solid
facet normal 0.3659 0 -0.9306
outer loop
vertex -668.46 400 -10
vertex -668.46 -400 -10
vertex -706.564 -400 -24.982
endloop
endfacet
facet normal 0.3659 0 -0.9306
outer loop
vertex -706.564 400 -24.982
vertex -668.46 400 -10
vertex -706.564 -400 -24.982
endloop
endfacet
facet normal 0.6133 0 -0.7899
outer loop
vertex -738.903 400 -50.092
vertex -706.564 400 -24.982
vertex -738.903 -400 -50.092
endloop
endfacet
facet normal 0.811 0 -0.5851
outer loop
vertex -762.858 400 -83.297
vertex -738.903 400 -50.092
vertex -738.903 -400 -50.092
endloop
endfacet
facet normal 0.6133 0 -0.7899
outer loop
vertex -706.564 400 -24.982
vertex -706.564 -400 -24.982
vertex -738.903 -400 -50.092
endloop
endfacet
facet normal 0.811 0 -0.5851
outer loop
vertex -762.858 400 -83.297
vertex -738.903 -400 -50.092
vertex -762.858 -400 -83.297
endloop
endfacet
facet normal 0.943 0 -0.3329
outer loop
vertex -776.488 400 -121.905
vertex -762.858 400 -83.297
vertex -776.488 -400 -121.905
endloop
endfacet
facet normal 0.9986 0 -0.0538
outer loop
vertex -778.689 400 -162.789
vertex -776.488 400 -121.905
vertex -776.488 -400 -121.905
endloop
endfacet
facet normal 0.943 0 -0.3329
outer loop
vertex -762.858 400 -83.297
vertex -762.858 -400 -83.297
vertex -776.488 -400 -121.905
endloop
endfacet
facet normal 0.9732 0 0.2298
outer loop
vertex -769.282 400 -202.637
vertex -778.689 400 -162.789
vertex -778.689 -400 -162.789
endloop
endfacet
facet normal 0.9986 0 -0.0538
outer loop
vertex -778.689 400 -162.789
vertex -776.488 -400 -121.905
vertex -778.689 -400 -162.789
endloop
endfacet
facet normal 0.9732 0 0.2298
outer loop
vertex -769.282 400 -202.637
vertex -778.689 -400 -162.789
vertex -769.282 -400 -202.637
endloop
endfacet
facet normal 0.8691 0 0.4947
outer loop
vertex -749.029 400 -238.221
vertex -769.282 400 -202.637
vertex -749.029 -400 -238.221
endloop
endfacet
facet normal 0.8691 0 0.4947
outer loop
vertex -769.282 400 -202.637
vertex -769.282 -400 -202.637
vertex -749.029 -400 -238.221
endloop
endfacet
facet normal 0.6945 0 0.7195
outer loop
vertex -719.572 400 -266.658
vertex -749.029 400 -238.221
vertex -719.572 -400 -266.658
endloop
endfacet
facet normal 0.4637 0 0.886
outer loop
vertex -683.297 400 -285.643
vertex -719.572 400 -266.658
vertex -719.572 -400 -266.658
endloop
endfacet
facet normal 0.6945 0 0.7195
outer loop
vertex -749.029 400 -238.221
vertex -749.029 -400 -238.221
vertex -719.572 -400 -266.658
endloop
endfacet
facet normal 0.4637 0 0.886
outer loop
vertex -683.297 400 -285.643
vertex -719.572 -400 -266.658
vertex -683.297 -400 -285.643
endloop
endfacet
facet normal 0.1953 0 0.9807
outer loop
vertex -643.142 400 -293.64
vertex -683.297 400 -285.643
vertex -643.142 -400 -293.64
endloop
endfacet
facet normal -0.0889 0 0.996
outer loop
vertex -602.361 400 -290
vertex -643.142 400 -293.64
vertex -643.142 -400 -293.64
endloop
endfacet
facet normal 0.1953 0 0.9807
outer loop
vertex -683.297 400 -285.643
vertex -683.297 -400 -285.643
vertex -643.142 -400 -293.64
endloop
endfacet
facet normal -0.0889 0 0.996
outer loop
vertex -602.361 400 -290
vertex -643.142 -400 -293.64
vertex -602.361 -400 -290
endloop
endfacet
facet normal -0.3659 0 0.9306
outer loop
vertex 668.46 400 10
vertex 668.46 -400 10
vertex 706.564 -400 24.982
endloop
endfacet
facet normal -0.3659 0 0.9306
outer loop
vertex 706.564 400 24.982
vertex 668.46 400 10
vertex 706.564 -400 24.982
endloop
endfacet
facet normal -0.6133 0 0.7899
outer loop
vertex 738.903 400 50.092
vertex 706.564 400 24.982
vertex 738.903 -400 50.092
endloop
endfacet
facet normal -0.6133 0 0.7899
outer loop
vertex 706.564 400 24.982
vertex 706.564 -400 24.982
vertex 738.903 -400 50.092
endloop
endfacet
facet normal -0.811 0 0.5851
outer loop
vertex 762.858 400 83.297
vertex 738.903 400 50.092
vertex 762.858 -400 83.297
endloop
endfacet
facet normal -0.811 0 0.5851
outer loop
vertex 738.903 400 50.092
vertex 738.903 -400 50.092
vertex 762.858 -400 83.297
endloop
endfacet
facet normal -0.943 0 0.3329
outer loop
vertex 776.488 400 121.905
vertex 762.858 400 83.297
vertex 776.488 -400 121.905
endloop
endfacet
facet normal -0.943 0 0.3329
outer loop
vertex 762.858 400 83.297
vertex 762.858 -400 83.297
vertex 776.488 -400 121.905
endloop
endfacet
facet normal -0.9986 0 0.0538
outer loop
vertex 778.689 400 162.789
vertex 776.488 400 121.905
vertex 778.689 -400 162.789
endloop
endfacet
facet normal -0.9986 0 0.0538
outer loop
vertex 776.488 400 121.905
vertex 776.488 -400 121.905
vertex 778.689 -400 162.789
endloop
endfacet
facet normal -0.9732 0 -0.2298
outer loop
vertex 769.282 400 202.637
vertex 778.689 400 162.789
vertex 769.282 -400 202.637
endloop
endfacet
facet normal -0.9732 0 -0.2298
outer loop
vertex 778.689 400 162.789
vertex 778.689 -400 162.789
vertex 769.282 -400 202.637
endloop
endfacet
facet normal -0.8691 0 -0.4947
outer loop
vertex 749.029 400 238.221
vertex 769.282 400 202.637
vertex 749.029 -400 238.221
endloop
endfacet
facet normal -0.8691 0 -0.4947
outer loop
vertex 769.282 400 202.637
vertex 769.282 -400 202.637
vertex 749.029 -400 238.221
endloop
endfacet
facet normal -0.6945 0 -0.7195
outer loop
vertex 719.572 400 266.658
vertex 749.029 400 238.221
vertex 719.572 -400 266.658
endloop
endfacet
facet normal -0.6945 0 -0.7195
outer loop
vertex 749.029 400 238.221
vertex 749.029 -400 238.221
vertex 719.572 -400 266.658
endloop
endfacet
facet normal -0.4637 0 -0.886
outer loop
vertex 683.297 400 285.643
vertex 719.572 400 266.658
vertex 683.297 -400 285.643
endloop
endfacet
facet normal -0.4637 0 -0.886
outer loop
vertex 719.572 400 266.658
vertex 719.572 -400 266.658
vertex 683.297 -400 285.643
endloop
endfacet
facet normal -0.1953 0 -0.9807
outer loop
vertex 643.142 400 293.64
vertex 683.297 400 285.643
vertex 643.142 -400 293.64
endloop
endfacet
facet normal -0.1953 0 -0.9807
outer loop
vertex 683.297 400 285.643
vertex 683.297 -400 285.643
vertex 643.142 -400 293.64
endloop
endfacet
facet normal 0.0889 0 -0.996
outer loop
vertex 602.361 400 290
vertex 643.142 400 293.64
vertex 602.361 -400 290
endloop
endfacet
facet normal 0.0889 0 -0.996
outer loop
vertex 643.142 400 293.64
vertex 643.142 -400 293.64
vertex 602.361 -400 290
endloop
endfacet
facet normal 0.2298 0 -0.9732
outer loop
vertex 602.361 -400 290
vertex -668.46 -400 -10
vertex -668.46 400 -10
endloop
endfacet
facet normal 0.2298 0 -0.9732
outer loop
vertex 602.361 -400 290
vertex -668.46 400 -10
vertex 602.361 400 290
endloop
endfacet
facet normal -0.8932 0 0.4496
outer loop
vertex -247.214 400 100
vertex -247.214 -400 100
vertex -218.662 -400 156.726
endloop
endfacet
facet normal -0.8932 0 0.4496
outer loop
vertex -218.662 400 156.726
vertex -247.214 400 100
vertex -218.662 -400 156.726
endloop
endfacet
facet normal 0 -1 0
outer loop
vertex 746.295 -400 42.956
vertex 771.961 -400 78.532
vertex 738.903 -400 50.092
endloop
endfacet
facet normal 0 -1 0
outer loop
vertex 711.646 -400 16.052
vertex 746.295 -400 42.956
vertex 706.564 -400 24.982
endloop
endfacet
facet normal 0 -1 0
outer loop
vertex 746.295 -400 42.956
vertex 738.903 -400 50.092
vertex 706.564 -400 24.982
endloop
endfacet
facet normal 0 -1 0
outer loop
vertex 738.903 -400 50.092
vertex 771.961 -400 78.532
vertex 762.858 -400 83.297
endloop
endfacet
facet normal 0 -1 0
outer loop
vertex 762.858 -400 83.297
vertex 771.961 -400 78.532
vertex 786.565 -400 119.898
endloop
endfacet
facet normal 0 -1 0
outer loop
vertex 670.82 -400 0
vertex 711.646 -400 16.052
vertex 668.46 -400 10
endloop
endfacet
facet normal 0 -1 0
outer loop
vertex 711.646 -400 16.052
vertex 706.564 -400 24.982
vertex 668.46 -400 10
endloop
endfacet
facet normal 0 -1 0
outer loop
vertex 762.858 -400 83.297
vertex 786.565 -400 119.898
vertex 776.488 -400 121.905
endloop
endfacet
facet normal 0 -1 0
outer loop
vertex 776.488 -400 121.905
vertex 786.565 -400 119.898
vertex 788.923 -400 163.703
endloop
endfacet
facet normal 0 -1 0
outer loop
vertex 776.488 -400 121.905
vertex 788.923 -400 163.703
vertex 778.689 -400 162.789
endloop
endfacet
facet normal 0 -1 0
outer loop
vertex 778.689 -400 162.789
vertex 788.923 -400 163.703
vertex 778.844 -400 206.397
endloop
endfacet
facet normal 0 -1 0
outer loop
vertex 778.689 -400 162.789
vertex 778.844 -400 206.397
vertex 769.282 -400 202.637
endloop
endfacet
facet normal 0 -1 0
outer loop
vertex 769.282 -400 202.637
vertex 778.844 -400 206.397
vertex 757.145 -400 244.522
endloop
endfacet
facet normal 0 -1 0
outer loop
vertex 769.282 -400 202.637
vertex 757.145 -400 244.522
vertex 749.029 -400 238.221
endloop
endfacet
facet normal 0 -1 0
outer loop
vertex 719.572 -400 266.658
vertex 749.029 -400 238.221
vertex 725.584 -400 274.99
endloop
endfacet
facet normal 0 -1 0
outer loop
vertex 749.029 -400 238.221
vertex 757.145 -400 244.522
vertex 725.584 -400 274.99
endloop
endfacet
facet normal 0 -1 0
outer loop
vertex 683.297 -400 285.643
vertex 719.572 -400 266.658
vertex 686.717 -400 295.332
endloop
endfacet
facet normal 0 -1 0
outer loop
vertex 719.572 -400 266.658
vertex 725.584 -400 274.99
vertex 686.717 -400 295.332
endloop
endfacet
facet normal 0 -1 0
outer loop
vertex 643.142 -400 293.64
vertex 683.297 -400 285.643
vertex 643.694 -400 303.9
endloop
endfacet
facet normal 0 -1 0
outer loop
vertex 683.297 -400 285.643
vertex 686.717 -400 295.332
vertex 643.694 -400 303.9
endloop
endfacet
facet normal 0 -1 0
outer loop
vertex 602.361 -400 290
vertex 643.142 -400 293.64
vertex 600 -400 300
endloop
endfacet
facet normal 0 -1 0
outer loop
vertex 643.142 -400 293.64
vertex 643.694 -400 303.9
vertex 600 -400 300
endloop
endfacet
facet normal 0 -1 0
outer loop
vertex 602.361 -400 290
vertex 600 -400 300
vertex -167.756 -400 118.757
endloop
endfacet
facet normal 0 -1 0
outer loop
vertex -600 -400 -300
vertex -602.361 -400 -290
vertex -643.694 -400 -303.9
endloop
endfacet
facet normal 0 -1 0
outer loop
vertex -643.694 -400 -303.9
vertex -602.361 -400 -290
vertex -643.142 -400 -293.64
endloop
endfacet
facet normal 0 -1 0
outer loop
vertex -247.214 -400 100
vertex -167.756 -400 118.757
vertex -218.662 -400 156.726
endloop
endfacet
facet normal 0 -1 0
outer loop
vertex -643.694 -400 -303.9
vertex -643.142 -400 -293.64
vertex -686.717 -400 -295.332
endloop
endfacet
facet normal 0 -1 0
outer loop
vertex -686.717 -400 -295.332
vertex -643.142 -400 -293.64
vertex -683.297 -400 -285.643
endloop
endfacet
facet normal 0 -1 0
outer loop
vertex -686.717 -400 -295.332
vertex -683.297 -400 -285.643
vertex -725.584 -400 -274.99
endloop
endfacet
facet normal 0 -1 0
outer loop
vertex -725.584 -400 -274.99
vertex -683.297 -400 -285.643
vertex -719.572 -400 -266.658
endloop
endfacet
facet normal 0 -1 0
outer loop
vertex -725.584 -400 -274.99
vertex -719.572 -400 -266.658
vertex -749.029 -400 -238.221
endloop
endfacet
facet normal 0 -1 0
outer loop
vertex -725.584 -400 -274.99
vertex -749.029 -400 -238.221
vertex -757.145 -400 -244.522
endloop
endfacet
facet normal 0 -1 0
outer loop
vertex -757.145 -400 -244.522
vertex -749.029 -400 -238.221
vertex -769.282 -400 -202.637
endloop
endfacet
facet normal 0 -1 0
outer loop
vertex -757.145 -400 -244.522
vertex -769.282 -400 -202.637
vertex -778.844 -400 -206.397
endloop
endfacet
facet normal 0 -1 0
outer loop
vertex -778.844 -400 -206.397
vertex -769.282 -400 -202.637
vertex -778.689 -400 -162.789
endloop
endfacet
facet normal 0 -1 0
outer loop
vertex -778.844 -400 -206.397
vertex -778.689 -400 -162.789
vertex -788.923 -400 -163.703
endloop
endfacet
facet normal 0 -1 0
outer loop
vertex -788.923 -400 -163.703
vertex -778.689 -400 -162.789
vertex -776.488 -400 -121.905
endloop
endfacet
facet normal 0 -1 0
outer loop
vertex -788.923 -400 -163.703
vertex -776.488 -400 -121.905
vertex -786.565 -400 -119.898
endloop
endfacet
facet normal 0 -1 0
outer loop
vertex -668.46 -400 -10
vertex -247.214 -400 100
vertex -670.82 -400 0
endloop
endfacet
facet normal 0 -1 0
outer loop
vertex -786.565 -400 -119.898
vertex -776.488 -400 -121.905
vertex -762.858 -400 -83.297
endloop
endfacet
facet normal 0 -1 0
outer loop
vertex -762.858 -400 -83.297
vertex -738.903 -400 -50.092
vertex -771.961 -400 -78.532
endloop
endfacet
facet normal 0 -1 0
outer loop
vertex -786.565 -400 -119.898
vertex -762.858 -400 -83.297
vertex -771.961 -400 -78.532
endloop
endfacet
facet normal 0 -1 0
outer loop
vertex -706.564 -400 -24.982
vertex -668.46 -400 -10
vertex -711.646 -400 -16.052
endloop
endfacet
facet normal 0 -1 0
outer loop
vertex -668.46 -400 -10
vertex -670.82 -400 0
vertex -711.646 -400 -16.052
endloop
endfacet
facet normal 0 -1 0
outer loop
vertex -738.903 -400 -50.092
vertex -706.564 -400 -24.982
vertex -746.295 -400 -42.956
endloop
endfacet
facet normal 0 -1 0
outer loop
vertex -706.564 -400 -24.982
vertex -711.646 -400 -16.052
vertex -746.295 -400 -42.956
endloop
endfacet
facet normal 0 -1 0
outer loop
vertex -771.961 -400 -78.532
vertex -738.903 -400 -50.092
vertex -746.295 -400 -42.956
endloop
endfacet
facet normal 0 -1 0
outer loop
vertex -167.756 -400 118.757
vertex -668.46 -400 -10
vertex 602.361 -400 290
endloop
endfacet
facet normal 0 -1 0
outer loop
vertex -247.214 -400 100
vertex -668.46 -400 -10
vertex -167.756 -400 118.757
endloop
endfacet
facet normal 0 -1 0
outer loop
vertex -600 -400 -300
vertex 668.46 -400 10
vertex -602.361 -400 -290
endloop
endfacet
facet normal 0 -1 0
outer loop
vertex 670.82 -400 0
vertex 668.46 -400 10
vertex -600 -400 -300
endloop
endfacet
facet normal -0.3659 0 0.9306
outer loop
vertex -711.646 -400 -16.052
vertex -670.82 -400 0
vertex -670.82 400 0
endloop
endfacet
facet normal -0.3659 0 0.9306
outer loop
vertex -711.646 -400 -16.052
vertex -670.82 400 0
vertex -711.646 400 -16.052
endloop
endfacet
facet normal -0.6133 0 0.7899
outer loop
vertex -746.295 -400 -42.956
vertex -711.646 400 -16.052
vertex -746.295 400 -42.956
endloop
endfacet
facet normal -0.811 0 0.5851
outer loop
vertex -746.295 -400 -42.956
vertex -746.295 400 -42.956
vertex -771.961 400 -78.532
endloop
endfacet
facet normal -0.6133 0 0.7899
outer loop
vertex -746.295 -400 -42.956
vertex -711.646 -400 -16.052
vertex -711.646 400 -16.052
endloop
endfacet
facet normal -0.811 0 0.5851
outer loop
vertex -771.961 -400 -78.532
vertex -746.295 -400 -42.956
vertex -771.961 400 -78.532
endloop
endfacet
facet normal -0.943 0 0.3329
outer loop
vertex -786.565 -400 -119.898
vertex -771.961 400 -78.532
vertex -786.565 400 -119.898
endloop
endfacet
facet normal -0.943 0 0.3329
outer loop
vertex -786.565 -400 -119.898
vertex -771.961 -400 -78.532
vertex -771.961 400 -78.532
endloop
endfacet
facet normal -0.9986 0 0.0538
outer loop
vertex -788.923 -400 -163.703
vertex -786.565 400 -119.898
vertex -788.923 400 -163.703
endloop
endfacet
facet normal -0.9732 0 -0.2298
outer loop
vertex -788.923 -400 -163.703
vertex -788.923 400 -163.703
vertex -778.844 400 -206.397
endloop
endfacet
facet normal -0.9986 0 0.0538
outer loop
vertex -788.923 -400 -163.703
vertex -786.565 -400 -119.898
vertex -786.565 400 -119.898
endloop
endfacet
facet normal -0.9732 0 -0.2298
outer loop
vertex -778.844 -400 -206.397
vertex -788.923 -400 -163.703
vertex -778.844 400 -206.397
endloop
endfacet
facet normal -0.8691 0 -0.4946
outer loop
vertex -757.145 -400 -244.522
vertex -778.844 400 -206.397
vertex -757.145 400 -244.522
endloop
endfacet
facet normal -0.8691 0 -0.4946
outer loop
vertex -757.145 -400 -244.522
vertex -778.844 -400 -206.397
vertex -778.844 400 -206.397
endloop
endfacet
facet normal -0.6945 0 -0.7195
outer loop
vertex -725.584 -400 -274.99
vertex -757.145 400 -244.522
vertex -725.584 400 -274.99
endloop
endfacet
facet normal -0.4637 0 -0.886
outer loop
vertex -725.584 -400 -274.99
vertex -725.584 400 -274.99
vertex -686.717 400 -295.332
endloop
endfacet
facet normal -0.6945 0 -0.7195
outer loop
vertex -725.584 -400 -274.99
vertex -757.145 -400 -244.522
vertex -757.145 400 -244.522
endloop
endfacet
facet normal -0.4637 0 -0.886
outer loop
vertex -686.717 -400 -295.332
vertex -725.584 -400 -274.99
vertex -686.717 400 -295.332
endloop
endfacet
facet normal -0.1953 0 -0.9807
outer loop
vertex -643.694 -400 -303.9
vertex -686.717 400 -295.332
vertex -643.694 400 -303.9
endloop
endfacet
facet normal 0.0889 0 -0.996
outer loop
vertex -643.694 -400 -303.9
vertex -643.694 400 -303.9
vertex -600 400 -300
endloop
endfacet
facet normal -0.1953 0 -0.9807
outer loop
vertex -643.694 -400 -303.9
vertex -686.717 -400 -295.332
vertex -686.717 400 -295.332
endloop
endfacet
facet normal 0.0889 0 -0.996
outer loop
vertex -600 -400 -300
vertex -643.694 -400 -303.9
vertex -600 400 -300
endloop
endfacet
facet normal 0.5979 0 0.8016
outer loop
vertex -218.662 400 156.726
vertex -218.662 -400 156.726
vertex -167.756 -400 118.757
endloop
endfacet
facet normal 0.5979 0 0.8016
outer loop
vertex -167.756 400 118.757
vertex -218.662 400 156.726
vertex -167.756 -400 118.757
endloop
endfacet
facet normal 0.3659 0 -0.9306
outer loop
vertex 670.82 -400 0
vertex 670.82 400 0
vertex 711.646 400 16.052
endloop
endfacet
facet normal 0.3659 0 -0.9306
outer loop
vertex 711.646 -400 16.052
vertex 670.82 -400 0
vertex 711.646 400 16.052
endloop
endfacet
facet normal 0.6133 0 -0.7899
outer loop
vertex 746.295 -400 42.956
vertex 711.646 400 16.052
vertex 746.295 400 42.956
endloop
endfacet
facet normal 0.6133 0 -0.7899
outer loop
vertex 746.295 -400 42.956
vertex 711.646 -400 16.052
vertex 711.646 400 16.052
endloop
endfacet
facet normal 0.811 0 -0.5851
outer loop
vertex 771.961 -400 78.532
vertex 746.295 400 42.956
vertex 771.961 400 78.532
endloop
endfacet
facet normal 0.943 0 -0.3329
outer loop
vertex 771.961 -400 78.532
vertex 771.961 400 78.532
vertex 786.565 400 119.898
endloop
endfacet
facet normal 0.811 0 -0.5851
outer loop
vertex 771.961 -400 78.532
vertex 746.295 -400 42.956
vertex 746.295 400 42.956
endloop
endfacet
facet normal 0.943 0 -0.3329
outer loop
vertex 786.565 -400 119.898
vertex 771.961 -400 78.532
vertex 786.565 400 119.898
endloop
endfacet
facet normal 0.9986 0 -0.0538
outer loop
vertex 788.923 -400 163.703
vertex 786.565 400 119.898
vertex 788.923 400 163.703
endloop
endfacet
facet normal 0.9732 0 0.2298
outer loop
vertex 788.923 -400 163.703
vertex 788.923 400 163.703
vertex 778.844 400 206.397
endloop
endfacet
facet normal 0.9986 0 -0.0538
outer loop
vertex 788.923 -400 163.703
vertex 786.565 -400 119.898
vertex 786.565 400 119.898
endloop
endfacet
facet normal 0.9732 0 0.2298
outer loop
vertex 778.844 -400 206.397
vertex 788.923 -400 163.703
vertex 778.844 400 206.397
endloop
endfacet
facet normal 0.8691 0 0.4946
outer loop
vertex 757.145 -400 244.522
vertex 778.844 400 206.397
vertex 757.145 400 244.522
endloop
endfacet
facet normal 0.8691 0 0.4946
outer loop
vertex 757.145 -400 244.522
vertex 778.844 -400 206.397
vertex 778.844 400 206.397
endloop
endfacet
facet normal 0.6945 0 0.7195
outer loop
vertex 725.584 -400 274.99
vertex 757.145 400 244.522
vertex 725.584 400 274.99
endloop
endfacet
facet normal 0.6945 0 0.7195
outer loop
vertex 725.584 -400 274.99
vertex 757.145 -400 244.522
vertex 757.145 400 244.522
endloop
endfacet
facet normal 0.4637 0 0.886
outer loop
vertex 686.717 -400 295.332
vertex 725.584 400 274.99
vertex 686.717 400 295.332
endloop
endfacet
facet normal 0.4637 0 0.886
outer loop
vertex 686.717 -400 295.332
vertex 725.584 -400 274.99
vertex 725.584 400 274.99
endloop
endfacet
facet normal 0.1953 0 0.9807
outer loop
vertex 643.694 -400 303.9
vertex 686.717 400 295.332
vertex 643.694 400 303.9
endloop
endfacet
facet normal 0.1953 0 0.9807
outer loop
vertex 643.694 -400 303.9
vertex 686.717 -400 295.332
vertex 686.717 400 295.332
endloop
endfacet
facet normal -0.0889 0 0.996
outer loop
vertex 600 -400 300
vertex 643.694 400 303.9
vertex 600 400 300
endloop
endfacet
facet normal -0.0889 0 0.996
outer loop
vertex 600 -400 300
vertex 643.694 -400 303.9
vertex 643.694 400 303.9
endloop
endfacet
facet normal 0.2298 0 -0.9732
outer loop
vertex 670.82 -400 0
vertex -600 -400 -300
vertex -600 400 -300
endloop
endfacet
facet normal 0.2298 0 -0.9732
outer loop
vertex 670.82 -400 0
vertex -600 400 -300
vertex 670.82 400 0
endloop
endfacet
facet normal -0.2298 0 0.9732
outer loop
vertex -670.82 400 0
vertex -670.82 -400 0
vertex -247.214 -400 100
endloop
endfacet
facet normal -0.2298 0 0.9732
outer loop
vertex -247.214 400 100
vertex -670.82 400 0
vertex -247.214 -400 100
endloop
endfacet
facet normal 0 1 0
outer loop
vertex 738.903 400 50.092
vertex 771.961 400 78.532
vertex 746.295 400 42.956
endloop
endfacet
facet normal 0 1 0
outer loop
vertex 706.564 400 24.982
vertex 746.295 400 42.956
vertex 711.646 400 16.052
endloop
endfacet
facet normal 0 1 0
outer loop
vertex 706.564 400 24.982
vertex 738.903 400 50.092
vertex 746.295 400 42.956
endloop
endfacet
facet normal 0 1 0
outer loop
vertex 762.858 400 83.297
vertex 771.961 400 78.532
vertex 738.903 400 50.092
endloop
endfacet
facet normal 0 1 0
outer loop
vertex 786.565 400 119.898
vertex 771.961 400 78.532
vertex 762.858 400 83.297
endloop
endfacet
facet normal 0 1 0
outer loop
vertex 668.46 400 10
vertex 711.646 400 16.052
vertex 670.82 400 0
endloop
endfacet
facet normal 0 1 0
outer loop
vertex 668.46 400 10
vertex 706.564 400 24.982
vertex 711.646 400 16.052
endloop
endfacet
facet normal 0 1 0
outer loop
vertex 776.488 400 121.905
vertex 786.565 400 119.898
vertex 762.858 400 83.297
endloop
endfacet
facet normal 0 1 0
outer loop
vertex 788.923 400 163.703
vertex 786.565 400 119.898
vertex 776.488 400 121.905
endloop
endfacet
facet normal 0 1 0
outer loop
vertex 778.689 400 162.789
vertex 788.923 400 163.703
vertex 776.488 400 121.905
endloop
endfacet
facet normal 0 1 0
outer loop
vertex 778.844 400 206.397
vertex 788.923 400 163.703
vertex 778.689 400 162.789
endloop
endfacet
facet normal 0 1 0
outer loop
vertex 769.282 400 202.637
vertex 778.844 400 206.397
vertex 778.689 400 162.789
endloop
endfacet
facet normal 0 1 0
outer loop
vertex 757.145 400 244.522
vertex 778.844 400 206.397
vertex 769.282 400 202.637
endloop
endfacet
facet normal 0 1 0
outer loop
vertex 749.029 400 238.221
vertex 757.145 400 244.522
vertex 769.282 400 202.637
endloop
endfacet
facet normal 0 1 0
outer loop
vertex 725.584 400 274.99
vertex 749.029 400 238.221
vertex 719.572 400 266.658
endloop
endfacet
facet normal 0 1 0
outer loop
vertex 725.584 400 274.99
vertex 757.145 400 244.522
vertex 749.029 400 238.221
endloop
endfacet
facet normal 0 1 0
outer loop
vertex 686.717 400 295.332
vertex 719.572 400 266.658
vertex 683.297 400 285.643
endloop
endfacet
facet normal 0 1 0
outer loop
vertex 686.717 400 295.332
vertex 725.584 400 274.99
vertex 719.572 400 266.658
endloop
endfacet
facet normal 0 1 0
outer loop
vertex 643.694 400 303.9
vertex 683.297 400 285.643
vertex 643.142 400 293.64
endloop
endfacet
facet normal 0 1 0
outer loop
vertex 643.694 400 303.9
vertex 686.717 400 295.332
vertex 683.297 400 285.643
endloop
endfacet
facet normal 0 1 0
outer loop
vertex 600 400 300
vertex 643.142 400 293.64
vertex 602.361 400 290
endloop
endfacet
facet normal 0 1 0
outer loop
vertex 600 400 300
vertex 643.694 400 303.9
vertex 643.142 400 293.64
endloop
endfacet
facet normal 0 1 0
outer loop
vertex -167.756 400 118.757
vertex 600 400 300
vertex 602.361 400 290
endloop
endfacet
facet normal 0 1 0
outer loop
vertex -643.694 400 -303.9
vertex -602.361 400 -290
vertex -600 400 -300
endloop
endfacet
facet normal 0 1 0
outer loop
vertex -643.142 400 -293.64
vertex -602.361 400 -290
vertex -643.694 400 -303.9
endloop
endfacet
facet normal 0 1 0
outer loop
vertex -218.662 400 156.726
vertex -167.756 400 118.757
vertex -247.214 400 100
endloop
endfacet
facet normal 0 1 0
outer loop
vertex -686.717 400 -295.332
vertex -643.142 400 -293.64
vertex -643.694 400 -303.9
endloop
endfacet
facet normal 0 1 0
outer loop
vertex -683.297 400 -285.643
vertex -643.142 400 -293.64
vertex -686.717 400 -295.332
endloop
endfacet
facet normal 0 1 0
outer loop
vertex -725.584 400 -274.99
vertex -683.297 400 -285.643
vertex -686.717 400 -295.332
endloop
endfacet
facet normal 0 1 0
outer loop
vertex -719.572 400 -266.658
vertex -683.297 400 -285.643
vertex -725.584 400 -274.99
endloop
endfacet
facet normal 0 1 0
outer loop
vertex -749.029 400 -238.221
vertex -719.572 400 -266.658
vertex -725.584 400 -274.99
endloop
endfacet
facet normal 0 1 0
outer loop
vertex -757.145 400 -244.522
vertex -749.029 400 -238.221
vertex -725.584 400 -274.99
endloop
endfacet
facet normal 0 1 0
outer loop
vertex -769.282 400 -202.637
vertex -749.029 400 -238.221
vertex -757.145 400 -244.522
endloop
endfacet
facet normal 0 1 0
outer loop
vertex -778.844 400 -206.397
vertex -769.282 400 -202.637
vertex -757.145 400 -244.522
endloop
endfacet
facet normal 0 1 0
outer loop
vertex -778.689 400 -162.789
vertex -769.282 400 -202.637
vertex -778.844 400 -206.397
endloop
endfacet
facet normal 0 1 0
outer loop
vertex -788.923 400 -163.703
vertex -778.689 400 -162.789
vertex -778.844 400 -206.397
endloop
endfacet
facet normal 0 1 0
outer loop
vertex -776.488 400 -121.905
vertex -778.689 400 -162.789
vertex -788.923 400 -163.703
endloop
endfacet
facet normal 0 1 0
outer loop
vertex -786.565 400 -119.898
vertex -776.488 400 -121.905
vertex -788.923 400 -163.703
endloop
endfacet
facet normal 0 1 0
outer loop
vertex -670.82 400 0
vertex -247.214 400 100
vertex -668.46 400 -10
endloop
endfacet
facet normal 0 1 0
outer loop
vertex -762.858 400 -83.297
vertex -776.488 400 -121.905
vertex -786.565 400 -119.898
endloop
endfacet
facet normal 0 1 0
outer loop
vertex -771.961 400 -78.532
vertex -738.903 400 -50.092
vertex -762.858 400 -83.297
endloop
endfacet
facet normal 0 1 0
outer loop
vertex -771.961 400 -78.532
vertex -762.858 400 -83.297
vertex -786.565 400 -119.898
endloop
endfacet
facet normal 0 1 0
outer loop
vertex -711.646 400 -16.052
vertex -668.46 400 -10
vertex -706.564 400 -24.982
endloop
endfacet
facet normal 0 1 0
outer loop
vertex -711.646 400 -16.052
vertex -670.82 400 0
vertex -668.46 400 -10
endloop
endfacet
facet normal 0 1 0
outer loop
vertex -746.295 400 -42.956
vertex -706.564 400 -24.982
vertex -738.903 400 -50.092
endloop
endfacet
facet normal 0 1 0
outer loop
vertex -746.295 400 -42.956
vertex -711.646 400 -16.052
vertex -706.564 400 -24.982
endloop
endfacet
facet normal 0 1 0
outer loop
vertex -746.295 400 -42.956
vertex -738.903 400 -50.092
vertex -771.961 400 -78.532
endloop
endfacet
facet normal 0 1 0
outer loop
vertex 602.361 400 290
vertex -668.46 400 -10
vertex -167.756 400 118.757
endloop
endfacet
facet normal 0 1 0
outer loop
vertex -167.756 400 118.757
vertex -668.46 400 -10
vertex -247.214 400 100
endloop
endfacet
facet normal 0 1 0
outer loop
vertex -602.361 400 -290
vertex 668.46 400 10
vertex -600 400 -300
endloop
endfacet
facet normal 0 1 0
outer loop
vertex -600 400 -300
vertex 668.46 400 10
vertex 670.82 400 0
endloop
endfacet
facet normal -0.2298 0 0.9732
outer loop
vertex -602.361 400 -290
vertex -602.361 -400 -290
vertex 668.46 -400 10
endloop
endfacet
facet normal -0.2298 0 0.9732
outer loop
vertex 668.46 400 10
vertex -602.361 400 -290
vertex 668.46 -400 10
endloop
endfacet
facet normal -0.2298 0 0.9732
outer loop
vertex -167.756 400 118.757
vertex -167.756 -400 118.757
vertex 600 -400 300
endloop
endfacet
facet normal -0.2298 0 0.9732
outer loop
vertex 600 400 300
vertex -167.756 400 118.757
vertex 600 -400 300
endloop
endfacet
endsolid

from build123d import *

# Parameters (mm, degrees)
PAD_DEPTH = 800


with BuildPart() as part:
    # Sketch → Pad (new body)
    with BuildSketch(Plane.XZ.offset(400)):
        with BuildLine():
            Line((-670.82039, 0), (-247.213593, 100))
            Line((-247.213593, 100), (-218.661794, 156.72588))
            Line((-218.661794, 156.72588), (-167.755704, 118.757463))
            Line((-167.755704, 118.757463), (600, 300))
            ThreePointArc((670.820393, 1e-06), (785.410194, 185.410196), (600, 300))
            Line((-600, -300), (670.820393, 1e-06))
            ThreePointArc((-670.82039, 0), (-785.410196, -185.410195), (-600, -300))
        make_face()
        with BuildLine():
            Line((-668.459715, -10), (602.360681, 290.000001))
            ThreePointArc((668.4598, 10.00002), (775.410185, 183.04956), (602.360681, 290.000001))
            Line((-602.360681, -290.000002), (668.4598, 10.00002))
            ThreePointArc((-668.459715, -10), (-775.410197, -183.049518), (-602.360681, -290.000002))
        make_face(mode=Mode.SUBTRACT)
    extrude(amount=-PAD_DEPTH)


solid = part.part
